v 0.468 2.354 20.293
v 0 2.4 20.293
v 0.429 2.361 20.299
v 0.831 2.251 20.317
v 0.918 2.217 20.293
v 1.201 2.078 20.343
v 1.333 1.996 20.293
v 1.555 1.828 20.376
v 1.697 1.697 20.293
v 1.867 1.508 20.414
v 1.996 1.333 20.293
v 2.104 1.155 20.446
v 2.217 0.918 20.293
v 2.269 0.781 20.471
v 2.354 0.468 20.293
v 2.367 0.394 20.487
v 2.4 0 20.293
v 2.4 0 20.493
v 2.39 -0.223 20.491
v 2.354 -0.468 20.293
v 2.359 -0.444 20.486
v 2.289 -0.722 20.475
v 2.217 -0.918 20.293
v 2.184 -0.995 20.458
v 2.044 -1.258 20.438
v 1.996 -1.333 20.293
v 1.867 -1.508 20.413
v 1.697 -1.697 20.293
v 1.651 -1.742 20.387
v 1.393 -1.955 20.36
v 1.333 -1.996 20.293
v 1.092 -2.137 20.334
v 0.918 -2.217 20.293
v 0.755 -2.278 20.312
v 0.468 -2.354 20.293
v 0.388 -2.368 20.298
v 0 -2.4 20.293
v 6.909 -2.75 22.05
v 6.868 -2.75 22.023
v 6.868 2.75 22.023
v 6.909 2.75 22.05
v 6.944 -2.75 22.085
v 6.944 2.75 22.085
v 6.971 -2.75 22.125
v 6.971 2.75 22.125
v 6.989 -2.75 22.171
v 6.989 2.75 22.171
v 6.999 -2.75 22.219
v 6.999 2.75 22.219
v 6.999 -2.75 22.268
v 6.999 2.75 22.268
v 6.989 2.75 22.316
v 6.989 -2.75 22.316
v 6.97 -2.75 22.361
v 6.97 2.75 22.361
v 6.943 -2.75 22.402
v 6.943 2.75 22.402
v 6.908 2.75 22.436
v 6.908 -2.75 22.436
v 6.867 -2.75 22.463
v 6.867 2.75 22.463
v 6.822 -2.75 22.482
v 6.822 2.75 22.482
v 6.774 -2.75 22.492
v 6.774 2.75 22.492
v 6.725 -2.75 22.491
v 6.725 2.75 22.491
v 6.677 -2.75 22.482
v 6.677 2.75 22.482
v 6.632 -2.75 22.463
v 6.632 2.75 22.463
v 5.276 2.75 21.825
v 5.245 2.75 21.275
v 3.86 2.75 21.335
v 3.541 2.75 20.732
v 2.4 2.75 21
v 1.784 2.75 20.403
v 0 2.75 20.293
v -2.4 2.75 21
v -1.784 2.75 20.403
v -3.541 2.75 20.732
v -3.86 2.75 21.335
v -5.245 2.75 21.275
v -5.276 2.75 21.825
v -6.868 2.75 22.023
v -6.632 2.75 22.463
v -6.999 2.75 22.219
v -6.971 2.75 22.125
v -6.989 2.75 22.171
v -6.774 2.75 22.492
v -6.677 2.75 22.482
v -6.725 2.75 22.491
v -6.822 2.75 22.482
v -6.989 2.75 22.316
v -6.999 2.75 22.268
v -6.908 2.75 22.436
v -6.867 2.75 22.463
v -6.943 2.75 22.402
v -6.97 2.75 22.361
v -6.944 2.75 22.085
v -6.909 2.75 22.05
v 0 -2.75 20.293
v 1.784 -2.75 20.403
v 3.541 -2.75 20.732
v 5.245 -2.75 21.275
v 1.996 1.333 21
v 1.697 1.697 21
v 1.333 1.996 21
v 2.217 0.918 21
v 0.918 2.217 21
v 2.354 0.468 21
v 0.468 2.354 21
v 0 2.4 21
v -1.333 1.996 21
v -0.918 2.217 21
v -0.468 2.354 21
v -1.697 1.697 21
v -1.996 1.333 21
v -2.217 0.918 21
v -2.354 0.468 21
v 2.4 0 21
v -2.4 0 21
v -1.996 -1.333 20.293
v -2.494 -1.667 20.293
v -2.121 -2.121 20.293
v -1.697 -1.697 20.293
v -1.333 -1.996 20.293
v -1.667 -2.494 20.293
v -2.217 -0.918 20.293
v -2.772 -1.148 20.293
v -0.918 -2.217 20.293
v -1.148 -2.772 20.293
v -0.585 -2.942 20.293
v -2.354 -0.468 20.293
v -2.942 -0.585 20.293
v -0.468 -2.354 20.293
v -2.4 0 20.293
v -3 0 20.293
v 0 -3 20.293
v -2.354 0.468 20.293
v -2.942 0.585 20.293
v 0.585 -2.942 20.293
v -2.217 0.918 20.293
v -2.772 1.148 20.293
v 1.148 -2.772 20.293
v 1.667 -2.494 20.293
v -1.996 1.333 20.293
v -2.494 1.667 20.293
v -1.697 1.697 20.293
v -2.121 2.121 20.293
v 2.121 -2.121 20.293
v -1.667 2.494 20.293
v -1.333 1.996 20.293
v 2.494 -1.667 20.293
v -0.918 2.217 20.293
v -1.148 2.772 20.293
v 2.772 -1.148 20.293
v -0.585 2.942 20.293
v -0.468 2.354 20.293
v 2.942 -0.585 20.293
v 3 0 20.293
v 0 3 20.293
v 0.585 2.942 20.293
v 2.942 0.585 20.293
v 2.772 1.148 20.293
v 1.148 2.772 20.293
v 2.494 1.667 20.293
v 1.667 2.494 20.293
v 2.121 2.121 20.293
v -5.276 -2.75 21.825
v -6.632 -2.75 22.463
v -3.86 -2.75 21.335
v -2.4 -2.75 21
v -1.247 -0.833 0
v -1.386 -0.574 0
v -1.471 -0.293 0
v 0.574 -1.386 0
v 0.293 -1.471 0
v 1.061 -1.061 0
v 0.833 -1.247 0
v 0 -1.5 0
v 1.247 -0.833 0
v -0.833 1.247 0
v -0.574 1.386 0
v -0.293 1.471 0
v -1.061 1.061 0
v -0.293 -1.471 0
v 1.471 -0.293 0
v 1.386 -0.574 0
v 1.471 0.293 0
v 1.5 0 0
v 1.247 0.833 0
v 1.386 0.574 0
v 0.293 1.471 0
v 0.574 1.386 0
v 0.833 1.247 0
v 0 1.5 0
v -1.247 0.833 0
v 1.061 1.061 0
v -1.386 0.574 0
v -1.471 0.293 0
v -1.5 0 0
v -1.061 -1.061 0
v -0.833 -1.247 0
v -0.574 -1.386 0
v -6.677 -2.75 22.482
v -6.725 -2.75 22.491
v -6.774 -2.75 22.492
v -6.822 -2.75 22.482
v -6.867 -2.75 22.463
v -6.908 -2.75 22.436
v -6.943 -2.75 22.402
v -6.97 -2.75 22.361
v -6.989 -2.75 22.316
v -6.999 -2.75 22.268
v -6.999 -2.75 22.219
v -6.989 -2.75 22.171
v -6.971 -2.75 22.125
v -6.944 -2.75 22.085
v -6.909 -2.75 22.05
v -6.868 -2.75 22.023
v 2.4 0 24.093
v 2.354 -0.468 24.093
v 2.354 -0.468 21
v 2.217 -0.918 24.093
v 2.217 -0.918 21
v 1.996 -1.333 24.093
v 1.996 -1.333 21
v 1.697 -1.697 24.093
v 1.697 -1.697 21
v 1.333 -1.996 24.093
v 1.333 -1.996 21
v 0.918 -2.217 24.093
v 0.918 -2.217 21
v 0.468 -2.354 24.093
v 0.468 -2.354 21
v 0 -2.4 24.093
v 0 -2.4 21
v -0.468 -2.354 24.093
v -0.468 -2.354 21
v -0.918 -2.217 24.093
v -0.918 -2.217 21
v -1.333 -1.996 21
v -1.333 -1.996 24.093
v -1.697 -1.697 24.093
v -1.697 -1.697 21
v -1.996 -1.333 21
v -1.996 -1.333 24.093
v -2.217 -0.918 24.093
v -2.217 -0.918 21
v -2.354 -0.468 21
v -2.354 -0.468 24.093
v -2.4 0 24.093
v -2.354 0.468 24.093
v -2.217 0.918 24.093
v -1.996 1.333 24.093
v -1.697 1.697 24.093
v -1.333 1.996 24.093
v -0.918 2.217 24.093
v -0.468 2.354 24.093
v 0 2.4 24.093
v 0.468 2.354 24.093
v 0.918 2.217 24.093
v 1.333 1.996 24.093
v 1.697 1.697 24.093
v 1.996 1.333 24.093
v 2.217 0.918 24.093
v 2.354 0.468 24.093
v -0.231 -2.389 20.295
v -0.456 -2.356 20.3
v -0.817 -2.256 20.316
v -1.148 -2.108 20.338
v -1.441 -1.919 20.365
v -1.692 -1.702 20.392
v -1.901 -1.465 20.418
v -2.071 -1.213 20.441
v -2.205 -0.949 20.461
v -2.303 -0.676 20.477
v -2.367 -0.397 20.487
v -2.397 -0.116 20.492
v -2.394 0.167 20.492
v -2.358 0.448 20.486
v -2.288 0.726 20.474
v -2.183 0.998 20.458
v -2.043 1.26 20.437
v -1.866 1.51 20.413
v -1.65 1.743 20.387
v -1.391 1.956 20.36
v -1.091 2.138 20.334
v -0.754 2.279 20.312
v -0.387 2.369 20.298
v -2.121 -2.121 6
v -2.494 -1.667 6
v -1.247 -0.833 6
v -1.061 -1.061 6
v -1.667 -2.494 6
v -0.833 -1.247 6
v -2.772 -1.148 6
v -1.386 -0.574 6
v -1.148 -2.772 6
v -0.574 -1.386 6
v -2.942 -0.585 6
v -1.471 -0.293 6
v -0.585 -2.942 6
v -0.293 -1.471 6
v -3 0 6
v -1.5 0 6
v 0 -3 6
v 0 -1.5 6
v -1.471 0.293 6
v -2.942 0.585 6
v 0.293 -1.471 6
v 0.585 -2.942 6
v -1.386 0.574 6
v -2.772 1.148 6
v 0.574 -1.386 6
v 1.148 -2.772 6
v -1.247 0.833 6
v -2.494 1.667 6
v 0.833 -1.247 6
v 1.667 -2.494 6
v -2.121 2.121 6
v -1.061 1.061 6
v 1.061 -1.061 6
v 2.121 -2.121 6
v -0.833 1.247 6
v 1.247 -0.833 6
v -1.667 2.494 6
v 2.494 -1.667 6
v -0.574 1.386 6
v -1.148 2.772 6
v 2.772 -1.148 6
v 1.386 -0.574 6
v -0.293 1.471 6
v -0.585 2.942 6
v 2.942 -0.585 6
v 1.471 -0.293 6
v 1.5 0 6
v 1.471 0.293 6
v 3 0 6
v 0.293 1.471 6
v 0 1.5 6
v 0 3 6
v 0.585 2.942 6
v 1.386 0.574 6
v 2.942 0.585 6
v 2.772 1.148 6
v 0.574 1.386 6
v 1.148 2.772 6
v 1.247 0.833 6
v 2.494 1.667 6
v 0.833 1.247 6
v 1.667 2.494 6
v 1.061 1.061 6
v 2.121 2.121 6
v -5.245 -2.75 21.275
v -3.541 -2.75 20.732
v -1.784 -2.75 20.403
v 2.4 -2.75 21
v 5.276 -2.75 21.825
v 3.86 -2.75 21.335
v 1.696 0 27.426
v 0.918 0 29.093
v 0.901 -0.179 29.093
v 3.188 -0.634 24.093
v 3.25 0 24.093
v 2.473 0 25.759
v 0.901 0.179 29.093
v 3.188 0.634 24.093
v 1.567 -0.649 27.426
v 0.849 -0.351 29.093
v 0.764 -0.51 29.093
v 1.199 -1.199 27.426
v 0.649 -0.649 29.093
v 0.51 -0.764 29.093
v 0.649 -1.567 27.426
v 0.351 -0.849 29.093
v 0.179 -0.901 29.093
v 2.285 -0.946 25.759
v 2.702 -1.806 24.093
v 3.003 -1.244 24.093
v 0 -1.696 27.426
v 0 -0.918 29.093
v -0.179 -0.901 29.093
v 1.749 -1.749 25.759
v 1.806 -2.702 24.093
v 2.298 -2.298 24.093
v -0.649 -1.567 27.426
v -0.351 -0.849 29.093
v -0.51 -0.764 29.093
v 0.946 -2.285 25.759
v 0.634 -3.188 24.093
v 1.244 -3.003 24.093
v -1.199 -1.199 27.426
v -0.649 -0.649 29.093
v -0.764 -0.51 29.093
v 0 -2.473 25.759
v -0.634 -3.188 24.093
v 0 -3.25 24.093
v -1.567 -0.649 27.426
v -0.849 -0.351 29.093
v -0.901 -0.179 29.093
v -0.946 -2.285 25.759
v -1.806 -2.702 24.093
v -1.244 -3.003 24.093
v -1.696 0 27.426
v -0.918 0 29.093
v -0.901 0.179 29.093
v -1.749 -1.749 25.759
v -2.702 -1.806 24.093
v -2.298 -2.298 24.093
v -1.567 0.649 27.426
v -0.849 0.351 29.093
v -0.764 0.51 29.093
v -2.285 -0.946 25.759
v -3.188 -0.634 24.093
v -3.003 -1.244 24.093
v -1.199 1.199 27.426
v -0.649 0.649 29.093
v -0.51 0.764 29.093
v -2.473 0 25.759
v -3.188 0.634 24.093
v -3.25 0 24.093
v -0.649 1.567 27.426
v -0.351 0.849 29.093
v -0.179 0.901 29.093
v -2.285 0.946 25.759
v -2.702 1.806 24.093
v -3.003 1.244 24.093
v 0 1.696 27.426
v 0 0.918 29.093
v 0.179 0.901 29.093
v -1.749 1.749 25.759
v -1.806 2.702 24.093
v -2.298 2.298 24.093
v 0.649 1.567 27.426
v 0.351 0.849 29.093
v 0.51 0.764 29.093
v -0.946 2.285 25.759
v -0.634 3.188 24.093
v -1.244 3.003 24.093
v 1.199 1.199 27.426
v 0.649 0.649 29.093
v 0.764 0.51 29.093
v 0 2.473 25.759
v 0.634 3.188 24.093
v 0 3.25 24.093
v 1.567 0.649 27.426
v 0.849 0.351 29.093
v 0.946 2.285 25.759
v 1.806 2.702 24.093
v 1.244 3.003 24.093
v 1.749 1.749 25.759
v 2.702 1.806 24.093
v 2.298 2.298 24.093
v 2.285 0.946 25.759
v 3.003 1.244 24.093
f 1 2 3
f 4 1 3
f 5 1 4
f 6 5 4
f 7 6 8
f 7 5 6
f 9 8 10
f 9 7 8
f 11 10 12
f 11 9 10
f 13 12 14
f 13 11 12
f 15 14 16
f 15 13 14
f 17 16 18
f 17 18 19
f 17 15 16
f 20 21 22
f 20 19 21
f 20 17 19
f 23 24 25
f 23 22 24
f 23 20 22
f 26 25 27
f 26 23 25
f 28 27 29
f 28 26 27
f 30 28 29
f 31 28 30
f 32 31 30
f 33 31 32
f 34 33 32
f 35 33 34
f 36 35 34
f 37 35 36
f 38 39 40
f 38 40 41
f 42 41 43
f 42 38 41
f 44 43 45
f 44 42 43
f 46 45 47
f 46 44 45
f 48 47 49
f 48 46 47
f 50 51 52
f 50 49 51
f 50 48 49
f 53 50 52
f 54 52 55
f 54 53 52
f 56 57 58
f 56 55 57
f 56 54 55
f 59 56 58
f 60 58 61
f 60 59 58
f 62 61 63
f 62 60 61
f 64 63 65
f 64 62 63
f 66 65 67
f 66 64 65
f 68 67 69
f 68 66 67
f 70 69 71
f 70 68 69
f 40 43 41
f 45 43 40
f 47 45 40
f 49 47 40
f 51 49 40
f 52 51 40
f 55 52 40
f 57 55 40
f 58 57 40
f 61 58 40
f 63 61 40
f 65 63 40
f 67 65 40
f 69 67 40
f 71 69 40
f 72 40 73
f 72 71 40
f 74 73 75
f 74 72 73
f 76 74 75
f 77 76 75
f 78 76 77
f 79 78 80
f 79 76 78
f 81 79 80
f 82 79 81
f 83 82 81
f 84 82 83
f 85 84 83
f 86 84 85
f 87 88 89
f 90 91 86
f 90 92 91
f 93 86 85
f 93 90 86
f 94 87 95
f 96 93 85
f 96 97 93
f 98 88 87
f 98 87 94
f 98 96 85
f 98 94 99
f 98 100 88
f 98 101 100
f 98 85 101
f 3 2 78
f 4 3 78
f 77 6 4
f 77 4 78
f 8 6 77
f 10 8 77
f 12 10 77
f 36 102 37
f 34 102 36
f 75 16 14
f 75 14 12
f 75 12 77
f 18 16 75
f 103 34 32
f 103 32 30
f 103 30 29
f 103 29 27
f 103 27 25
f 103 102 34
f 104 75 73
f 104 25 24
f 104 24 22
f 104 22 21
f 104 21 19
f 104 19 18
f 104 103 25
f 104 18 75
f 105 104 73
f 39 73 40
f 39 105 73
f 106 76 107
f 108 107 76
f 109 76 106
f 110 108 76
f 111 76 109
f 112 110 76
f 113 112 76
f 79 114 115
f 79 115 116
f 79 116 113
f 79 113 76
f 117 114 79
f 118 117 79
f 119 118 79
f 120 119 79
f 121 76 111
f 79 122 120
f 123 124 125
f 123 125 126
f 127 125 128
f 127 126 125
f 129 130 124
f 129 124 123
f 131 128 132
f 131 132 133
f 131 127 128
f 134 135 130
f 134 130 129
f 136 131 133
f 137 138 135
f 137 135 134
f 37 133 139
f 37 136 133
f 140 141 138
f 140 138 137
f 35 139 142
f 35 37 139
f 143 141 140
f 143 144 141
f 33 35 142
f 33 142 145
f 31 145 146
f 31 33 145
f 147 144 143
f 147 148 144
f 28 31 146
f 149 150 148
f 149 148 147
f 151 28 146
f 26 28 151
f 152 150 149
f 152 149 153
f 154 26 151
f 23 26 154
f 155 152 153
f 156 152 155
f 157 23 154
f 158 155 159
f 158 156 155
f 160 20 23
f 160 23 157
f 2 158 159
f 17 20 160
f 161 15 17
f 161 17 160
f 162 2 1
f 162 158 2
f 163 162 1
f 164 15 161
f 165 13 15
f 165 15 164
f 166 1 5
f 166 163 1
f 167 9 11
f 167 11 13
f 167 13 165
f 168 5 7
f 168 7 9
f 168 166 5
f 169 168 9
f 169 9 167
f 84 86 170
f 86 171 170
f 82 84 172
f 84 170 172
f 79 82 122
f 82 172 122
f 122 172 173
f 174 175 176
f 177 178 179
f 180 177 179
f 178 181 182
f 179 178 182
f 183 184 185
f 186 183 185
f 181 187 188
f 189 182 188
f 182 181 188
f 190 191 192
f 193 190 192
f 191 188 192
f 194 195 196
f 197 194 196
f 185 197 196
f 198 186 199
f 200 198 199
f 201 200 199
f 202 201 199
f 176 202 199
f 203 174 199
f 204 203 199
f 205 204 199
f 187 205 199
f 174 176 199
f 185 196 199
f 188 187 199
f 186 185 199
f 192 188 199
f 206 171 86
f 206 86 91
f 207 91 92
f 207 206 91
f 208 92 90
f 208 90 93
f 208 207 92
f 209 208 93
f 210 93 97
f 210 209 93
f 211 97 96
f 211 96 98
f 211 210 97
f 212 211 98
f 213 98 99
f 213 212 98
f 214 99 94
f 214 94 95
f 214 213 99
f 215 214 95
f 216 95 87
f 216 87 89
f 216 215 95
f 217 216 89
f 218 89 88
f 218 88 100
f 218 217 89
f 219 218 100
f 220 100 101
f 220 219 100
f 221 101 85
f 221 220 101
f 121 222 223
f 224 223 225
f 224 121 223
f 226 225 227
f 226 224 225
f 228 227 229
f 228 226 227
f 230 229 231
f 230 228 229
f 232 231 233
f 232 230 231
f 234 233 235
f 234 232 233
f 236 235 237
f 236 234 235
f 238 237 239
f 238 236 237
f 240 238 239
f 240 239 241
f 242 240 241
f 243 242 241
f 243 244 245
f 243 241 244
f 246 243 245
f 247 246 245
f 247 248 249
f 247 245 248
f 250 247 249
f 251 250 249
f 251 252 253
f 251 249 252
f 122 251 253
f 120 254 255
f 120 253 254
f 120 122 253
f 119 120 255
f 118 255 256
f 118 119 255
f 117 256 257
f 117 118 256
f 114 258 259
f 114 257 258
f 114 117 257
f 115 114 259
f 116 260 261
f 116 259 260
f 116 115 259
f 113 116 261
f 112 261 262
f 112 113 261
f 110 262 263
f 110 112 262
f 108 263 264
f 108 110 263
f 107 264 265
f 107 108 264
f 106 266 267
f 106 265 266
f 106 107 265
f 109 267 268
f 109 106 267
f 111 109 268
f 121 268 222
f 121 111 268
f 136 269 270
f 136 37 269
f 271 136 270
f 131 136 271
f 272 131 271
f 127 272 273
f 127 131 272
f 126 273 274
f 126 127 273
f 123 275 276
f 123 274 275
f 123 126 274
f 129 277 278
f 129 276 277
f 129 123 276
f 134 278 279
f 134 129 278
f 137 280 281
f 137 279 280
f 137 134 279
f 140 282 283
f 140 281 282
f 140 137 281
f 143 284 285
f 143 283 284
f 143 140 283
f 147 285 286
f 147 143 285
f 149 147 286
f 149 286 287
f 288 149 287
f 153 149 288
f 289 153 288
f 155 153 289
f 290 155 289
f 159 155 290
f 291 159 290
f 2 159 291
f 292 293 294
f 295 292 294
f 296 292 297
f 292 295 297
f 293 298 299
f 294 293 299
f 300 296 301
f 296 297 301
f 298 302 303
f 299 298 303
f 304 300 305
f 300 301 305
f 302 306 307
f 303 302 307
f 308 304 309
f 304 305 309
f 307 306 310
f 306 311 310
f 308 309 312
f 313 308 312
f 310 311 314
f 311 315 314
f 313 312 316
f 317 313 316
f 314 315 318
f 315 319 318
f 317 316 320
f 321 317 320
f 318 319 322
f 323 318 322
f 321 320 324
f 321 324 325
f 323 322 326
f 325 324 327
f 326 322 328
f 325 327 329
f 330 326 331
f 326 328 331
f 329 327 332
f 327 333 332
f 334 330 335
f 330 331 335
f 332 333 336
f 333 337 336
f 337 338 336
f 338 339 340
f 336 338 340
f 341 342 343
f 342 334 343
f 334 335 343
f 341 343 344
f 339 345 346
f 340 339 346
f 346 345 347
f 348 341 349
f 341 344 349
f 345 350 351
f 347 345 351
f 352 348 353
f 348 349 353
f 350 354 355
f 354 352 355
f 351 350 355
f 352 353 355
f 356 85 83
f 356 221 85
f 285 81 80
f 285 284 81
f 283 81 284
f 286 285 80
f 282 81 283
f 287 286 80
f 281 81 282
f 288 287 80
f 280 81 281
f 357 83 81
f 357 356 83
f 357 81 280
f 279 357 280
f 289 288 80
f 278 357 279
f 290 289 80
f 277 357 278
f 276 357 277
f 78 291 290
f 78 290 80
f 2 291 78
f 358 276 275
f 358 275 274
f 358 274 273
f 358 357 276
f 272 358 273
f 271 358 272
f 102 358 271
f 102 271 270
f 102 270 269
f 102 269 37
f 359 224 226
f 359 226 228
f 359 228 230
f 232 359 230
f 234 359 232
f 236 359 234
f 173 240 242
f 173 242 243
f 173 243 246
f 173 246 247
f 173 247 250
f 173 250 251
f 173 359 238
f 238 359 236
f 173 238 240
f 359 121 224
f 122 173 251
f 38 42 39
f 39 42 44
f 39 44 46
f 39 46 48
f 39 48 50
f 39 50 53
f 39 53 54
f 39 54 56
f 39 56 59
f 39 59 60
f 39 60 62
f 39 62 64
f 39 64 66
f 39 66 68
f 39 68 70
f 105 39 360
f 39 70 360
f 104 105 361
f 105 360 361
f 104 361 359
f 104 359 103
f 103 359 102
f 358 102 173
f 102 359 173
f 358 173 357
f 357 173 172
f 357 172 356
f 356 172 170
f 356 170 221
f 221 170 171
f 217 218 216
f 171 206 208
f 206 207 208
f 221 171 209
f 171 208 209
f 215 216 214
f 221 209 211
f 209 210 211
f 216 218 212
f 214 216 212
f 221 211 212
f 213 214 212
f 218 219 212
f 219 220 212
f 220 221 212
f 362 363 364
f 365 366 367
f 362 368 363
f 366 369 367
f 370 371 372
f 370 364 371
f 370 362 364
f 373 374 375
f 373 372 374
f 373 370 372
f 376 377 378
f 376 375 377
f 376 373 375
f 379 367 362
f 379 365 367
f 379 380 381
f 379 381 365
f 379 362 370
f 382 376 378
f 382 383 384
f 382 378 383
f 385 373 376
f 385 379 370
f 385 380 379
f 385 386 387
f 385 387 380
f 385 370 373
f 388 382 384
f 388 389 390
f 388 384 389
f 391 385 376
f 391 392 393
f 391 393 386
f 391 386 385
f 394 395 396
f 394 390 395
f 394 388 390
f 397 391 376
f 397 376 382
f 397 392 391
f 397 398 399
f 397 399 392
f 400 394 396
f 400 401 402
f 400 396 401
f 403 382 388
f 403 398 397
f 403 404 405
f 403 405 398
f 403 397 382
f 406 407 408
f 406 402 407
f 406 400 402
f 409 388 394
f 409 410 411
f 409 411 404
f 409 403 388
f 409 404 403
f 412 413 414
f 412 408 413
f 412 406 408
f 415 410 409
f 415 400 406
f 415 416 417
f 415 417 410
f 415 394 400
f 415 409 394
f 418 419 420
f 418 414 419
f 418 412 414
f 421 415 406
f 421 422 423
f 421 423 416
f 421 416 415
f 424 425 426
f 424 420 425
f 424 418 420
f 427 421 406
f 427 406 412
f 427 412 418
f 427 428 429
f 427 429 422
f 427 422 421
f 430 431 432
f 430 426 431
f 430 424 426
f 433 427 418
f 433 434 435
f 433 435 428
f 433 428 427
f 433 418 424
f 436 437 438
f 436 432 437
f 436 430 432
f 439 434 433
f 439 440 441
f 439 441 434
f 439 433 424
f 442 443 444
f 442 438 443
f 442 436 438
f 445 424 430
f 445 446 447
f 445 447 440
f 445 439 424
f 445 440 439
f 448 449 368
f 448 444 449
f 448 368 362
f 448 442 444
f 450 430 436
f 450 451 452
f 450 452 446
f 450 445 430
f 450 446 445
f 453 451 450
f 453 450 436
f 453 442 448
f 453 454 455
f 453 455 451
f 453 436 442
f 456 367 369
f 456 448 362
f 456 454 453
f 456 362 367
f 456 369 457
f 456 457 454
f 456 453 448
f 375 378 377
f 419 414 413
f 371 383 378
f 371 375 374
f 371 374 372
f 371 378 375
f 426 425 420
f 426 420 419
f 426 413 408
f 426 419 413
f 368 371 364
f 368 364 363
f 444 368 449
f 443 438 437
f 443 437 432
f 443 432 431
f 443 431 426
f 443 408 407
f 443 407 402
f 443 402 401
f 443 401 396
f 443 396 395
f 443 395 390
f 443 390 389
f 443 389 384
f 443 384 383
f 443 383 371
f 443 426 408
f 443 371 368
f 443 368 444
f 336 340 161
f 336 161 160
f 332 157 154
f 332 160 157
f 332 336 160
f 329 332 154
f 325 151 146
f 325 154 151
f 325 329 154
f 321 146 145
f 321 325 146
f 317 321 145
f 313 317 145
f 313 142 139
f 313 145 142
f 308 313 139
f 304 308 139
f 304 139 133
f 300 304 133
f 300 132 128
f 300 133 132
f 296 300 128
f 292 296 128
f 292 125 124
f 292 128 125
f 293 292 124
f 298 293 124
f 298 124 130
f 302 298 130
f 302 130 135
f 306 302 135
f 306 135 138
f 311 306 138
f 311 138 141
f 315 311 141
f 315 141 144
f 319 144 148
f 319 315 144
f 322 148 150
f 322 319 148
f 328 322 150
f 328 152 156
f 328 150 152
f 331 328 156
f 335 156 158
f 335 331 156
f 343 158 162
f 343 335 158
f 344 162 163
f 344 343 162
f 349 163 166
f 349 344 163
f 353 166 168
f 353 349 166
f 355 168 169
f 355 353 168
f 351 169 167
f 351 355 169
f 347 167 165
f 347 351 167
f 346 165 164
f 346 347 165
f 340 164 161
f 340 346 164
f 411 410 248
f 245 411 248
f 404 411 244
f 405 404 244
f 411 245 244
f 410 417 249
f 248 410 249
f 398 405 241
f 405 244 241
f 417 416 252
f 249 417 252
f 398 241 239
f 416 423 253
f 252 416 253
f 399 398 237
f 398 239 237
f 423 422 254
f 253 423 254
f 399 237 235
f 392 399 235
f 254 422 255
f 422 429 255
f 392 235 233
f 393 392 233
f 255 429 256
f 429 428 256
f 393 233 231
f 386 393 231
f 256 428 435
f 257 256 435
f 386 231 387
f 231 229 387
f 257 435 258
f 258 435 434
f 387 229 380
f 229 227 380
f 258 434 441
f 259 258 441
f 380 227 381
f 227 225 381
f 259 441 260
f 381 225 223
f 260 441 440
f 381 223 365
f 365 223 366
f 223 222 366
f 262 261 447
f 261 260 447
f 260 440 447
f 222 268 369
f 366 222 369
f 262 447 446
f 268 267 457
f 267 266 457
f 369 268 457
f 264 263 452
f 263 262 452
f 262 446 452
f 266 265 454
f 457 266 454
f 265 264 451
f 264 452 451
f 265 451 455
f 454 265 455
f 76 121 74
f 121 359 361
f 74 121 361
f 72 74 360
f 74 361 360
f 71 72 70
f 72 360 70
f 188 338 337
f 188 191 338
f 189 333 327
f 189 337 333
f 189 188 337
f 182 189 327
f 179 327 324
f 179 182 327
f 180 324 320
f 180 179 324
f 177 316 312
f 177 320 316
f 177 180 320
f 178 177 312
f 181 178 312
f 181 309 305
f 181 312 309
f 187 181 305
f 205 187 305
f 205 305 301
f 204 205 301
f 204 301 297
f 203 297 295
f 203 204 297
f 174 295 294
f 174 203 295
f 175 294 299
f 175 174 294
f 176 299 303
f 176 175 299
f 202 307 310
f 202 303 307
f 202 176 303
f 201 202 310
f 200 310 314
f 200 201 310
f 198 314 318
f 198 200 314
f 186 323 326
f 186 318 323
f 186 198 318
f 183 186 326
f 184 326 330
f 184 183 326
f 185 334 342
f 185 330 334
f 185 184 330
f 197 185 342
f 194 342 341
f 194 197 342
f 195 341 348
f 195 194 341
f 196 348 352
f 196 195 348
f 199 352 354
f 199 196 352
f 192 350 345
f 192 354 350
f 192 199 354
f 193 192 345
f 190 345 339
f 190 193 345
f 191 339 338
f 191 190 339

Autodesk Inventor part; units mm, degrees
ref_plane "YZ Plane" through (0, 0, 0) normal (1, 0, 0) x (0, 1, 0)
ref_plane "XZ Plane" through (0, 0, 0) normal (0, 1, 0) x (-1, 0, 0)
ref_plane "XY Plane" through (0, 0, 0) normal (0, 0, 1) x (1, 0, 0)
sketch "Sketch1" plane through (0, 0, 0) normal (0, 1, 0) x (-1, 0, 0)
  line L0 (0, 0) -> (0, 29.0928)
  line L1 (0, 29.0928) -> (-0.9185, 29.0928)
  line L2 (-0.9185, 29.0928) -> (-3.25, 24.0928)
  line L3 (-3.25, 24.0928) -> (-2.4, 24.0928)
  line L4 (-2.4, 24.0928) -> (-2.4, 20.2928)
  line L5 (-2.4, 20.2928) -> (-3, 20.2928)
  line L6 (-3, 20.2928) -> (-3, 6)
  line L7 (-3, 6) -> (-1.5, 6)
  line L8 (-1.5, 6) -> (-1.5, 0)
  line L9 (-1.5, 0) -> (0, 0)
  arc A0 (-6.8684, 22.0226) -> (0, 20.2928) centre (0, 34.7935) ccw
  arc A1 (-6.6316, 22.4629) -> (-2.4, 21) centre (0, 34.7935) ccw
  arc A2 (-6.6316, 22.4629) -> (-6.8684, 22.0226) centre (-6.75, 22.2428) ccw
  line L10 (-2.4, 21) -> (0, 21)
  point P0 (0, 10)
  dimension "d0" = 3
  dimension "d1" = 6
  dimension "d3" = 6
  dimension "d4" = 5
  dimension "d5" = 6.5
  dimension "d9" = 8.8
  dimension "d10" = 25
  dimension "d11" = 4.8
  dimension "d15" = 15
  dimension "d17" = 14
  dimension "d18" = 0.5
  dimension "d19" = 1.6
revolve "Revolution1" add sketch "Sketch1" angle 360 about axis through (0, 0, 0) along (0, 0, 1) contours L9 L8 L7 L6 L5 L4 A0 L0 | A0 L4 L10 L0 | L10 L4 L3 L2 L1 L0
extrude "Extrusion1" add sketch "Sketch1" along normal mid plane 5.5 contours A0 L4 L10 L0 | A0 A2 A1 L4
mirror "Mirror1" about plane through (0, 0, 20.2928) normal (-1, 0, 0) of "Extrusion1"
properties part number "WBN-315" material "Acetal Resin, White"
